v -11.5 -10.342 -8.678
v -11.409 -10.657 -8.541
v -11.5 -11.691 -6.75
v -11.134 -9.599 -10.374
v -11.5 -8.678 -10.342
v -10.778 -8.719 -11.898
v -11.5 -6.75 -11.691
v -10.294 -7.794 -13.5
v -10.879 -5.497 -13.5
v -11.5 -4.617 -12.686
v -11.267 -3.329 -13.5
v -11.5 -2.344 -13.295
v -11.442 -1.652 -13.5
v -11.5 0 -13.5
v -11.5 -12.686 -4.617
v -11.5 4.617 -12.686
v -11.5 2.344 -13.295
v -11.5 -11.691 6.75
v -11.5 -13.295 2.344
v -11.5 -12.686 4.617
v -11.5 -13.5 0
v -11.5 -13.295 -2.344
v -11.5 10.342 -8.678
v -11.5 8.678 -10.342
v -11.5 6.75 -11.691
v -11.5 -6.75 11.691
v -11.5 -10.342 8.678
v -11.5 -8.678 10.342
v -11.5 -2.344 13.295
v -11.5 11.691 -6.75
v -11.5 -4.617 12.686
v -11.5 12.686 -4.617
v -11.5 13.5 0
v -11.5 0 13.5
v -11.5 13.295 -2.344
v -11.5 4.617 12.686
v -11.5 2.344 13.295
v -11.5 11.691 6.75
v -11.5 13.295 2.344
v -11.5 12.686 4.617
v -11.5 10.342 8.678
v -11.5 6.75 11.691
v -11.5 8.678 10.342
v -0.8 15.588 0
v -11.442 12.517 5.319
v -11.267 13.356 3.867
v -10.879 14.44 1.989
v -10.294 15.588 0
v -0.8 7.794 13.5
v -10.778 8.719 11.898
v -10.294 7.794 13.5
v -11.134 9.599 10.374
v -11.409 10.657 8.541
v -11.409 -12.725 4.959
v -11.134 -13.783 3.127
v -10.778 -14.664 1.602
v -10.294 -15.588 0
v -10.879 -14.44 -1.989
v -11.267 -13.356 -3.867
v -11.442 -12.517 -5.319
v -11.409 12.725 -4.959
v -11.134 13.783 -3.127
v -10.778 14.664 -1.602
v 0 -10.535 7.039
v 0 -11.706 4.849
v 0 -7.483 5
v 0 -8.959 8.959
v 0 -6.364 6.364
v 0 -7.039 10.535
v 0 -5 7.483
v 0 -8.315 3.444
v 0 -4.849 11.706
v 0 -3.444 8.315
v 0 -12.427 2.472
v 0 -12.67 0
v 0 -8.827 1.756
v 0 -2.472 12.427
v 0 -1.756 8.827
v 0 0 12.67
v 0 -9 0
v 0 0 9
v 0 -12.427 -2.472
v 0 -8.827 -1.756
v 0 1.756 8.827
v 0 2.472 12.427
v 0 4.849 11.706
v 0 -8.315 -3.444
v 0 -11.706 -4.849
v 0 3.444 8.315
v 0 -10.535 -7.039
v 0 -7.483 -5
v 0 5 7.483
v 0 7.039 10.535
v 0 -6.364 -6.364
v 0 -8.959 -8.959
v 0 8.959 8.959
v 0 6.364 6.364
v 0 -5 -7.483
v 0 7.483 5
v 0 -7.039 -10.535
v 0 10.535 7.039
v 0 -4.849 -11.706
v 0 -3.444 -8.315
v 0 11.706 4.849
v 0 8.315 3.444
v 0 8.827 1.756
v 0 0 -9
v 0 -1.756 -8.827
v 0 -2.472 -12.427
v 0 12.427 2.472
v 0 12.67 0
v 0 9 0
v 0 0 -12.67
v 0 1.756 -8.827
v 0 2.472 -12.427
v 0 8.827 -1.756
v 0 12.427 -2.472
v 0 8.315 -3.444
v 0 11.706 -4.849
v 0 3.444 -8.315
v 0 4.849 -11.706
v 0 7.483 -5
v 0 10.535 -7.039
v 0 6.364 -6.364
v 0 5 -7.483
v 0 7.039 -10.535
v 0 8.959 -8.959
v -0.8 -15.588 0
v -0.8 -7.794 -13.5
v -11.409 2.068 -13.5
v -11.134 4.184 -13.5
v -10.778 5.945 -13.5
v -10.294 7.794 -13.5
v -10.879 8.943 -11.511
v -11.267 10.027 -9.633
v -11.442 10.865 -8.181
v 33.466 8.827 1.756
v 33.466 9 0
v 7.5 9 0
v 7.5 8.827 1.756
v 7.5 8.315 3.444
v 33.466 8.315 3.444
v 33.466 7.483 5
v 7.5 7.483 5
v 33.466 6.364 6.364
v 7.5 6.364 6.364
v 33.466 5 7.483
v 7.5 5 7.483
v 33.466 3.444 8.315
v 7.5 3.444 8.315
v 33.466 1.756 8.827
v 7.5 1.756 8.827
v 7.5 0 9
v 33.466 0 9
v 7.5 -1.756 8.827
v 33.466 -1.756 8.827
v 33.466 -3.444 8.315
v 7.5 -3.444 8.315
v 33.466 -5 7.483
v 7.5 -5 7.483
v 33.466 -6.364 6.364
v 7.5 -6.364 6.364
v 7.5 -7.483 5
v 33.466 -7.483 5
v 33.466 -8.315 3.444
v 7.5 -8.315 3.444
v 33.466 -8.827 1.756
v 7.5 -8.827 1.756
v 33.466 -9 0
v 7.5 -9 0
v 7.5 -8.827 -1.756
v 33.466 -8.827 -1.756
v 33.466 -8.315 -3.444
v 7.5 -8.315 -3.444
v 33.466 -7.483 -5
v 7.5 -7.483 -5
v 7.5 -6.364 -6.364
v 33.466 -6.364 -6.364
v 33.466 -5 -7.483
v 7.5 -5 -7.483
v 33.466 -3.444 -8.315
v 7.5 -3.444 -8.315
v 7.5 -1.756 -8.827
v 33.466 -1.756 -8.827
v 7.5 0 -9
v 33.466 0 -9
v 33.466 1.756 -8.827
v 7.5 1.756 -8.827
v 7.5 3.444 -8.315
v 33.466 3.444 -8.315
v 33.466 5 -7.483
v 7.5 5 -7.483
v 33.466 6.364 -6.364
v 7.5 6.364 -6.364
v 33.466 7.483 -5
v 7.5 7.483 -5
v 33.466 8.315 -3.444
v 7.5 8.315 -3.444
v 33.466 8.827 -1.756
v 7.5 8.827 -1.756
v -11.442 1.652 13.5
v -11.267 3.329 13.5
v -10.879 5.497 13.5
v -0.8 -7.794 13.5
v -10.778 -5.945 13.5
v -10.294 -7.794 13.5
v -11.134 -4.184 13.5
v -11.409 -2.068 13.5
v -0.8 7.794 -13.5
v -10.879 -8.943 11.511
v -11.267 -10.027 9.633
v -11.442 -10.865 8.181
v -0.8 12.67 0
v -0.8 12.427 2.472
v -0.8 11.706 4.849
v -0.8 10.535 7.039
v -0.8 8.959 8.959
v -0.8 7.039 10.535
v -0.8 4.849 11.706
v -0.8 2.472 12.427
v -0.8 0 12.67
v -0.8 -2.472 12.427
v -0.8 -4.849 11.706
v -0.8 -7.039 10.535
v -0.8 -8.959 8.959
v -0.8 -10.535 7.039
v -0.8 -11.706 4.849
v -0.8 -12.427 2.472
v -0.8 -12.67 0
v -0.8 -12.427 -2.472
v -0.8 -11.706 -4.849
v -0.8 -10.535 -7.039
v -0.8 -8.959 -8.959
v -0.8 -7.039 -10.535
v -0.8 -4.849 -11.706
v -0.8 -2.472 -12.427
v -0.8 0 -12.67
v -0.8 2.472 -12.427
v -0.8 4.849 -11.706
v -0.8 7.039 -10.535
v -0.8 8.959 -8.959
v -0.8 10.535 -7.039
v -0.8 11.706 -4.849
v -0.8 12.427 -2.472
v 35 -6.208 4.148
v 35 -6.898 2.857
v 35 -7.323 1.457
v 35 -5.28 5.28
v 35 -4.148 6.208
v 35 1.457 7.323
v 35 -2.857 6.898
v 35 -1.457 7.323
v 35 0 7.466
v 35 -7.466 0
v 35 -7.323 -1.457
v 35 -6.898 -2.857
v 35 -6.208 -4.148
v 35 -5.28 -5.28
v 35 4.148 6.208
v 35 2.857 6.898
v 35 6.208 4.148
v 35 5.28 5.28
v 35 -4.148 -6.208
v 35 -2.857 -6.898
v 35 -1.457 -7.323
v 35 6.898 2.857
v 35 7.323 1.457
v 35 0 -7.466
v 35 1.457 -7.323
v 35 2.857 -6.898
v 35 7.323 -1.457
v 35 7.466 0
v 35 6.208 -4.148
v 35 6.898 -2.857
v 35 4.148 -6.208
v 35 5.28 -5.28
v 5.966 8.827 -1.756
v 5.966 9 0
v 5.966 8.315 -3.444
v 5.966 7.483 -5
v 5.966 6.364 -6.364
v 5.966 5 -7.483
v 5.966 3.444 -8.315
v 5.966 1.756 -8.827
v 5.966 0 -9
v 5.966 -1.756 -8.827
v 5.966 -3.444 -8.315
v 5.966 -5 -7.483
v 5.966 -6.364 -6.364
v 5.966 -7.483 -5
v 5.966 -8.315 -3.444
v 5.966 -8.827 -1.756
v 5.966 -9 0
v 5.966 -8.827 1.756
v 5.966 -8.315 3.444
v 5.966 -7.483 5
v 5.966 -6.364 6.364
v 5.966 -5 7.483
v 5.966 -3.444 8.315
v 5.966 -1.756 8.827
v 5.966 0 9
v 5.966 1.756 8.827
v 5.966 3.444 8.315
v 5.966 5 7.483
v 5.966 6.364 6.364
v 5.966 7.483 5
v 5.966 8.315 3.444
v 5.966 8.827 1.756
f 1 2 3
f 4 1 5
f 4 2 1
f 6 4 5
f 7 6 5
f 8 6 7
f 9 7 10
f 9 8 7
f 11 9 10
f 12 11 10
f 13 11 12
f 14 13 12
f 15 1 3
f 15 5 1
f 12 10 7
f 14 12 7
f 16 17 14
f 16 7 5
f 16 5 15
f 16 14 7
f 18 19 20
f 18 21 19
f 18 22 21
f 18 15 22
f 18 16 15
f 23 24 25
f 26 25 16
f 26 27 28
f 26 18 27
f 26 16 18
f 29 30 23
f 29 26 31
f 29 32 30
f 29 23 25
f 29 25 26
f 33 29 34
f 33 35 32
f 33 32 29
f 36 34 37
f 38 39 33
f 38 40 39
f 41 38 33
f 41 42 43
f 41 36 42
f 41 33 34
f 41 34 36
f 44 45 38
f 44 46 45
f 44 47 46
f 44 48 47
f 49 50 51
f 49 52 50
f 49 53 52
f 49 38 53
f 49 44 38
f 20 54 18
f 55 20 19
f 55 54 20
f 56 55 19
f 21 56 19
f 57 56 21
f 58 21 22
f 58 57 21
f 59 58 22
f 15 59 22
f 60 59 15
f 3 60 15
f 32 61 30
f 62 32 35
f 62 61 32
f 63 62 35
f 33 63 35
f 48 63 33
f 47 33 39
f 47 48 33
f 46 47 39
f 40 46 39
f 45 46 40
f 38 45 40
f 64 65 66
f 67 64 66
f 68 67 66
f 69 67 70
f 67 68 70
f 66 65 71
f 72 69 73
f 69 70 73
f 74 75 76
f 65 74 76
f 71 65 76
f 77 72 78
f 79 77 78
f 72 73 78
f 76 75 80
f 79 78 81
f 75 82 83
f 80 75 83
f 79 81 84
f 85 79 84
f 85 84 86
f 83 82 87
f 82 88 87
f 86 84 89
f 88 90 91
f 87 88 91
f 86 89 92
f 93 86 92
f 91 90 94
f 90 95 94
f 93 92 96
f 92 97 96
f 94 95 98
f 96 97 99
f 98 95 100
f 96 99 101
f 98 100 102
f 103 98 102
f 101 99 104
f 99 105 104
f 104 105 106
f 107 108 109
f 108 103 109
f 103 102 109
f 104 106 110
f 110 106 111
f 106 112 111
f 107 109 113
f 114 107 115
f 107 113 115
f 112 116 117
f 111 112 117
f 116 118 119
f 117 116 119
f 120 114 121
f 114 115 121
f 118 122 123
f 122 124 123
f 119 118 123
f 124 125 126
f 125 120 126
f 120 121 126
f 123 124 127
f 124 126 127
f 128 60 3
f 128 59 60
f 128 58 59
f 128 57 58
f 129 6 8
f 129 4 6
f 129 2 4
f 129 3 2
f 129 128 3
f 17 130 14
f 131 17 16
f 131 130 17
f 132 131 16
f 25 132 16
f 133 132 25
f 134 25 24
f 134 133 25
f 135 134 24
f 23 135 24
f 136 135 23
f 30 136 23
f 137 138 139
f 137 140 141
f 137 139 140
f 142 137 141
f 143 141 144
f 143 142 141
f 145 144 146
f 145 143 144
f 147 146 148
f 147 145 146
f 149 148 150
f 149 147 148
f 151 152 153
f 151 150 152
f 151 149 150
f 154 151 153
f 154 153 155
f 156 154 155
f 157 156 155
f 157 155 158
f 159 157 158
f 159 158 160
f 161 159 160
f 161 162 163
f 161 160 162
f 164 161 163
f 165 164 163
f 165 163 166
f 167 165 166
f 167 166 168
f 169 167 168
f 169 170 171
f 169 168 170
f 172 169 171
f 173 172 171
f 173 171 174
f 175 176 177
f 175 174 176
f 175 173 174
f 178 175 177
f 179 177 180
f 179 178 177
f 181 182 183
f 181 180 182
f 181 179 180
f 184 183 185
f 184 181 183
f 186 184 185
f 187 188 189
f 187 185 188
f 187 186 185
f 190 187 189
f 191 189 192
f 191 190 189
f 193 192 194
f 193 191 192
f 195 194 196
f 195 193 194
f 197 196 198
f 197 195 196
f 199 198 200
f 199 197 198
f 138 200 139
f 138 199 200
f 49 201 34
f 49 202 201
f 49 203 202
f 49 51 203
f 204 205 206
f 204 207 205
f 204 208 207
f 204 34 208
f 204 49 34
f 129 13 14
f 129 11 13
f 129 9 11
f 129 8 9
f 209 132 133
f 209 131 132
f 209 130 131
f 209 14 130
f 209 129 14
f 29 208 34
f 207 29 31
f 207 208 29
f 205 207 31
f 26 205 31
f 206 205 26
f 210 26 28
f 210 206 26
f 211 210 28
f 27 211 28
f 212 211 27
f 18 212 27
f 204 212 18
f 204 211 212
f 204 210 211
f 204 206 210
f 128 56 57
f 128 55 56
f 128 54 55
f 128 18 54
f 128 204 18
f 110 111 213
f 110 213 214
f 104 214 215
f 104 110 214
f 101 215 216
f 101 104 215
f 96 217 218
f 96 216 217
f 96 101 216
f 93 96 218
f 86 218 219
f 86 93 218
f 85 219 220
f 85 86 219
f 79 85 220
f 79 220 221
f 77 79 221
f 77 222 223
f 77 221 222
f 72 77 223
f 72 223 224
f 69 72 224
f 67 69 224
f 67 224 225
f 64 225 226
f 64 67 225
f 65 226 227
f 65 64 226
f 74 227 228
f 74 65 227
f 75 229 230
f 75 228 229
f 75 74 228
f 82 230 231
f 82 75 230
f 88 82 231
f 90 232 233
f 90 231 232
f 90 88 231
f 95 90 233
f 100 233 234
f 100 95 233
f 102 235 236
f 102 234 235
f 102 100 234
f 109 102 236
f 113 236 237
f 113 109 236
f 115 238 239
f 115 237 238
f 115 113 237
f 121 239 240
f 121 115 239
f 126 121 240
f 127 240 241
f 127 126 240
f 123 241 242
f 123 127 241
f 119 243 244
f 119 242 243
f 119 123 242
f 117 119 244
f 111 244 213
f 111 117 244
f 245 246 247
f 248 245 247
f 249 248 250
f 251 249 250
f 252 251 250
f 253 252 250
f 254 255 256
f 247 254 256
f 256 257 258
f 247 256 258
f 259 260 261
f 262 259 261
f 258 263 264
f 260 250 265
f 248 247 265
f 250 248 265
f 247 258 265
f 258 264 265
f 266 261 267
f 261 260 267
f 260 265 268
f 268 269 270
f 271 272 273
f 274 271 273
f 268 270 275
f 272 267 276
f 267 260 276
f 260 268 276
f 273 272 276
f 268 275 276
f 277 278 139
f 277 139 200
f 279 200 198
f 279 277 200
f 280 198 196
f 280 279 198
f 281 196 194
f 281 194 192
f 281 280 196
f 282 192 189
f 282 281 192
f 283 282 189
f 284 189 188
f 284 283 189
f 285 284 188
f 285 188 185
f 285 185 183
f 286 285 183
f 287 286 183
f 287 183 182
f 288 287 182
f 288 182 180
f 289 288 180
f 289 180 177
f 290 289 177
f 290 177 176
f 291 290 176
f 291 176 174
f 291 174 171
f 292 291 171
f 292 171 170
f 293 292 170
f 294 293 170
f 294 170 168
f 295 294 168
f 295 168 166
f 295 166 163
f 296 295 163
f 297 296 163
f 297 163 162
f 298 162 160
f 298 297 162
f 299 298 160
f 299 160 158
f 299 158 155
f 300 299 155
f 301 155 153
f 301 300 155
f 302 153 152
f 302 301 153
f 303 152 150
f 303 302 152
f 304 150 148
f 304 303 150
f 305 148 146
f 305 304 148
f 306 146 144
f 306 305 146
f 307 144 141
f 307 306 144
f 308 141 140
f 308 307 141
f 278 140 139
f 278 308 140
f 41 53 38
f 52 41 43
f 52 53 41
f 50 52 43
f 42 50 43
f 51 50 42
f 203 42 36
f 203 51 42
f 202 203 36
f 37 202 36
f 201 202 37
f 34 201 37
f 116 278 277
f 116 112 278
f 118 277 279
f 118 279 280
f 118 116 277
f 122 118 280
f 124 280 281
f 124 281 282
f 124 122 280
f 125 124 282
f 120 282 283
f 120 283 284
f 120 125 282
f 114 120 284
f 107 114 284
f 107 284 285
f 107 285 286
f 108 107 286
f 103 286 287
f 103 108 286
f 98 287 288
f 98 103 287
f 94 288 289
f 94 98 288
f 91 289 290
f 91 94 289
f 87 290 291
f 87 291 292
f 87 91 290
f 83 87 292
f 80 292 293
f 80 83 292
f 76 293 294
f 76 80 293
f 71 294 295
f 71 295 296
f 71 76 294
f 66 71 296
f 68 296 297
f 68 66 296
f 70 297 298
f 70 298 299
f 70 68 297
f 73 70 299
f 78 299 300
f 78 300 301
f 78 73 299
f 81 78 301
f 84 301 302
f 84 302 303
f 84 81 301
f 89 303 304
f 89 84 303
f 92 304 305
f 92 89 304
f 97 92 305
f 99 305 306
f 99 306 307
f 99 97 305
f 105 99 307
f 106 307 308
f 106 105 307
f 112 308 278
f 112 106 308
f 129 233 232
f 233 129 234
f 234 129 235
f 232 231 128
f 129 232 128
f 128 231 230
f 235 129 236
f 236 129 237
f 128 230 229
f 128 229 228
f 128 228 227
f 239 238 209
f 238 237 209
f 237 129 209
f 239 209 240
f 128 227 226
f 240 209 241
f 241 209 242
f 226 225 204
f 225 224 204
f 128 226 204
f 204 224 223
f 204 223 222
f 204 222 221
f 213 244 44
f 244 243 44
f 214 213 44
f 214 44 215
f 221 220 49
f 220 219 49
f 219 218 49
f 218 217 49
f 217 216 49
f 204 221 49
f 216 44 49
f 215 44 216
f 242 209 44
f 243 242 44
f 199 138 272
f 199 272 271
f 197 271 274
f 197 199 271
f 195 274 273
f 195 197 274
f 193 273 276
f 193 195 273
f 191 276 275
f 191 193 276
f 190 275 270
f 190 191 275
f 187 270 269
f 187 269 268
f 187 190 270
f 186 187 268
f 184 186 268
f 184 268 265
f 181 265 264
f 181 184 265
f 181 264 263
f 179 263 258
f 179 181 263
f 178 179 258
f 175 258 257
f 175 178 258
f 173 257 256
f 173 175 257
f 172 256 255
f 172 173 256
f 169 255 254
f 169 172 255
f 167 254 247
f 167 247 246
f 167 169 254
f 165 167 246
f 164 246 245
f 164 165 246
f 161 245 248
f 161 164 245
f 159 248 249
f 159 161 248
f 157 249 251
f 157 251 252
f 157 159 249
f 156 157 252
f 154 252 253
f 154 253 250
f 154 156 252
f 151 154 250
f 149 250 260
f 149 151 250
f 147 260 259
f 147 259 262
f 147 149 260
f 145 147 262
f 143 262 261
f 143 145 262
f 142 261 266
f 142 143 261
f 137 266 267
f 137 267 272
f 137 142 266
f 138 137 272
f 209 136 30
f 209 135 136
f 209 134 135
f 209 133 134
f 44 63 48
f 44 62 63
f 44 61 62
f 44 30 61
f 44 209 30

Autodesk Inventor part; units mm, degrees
ref_plane "YZ Plane" through (0, 0, 0) normal (1, 0, 0) x (0, 1, 0)
ref_plane "XZ Plane" through (0, 0, 0) normal (0, 1, 0) x (-1, 0, 0)
sketch "Sketch1" plane through (0, 0, 0) normal (0, 0, 1) x (1, 0, 0)
  line L0 (0, 12.67) -> (0, 9)
  line L1 (7.5, 9) -> (35, 9)
  line L2 (35, 9) -> (35, 0)
  line L3 (35, 0) -> (-0.8001, 0)
  line L4 (-7.9601, 0) -> (42.16, 0) projected
  line L5 (-0.8001, 0) -> (-0.8001, 12.67)
  line L6 (-0.8001, 12.67) -> (0, 12.67)
  line L7 (7.5, 9) -> (5.9663, 9)
  line L8 (5.9663, 9) -> (0, 9)
  line L9 (0, -2.534) -> (0, 15.204) projected
  dimension "d0" = 35
  dimension "d1" = 27.5
  dimension "d2" = 18
  dimension "d9" = 0.8001
  dimension "d10" = 25.34
  dimension "d13" = 1.5337
  dimension "d14" = 18
revolve "Body" add sketch "Sketch1" angle 360 about axis through (35, 0, 0) along (-1, 0, 0)
sketch "Sketch2" plane through (-0.8001, 0, 0) normal (-1, 0, 0) x (0, 0, 1)
  line L0 (0, 15.5885) -> (13.5, 7.7942)
  line L1 (13.5, 7.7942) -> (13.5, -7.7942)
  line L2 (13.5, -7.7942) -> (0, -15.5885)
  line L3 (0, -15.5885) -> (-13.5, -7.7942)
  line L4 (-13.5, -7.7942) -> (-13.5, 7.7942)
  line L5 (-13.5, 7.7942) -> (0, 15.5885)
  point P0 (0, 0)
  point P1 (0, 0)
  dimension "d11" = 27
extrude "Head" add sketch "Sketch2" along normal blind 10.7
sketch "Sketch4" plane through (0, 0, 0) normal (0, 0, 1) x (1, 0, 0)
  line L0 (-11.5001, 13.5) -> (-11.5001, 15.5885)
  line L1 (-11.5001, 15.5885) -> (-10.2943, 15.5885)
  line L2 (-10.2943, 15.5885) -> (-11.5001, 13.5)
  line L3 (-13.6401, 0) -> (1.3399, 0) projected
  line L4 (-0.8001, 15.5885) -> (-11.5001, 15.5885) projected
  line L5 (-11.5001, 7.7942) -> (-11.5001, 15.5885) projected
  dimension "d5" = 30
  dimension "d19" = 27
revolve "Chamfer1" cut sketch "Sketch4" angle 360 about axis through (-10, 0, 0) along (1, 0, 0)
thread "Thread" size "M18x2.5" class "6g" standard "ISO Metric profile" length 27.5
chamfer "Chamfer2" distance 1.5336 distance2 1.5337 1 edges at (35, -9, 0) measured on face at (35, 1.0638, -2.805)
ref_plane "Work Plane1" through (1.525, 0, 0) normal (0, 0, 1) x (1, 0, 0)
equation "\"d0\" = NLG"
equation "\"d1\" = GEL"
equation "\"d2\" = GD"
equation "\"d10\" = SD2"
equation "\"d14\" = BDM"
equation "\"d11\" = SW"
equation "\"d3\" = KOH - SD"
equation "\"d5\" = ANG1"
equation "\"d19\" = SW0"
equation "\"d15\" = GEL"
equation "\"d6\" = -0.5 * SPD + 0.5 * GD"
equation "\"NLG\" = 35"
equation "\"GD\" = NND"
equation "\"BDM\" = NND"
equation "\"KOH\" = 11.5"
equation "\"GEL\" = 27.5"
equation "\"SW\" = 27"
equation "\"SW0\" = SW"
equation "\"SPD\" = NND - 1.2269 * PTC"
equation "\"SD2\" = 25.34"
equation "\"SD\" = 0.8"
equation "\"ANG1\" = 30deg"
equation "\"GAL\" = 0.61345 * PTC"
equation "\"GUL\" = 0.61345 * PTC"
equation "\"RR\" = 0.6"
equation "\"GD1\" = THREADDIA - 1.2269 * PTC"
equation "\"THREADDIA\" = 18"
equation "\"SDH\" = SD2"
equation "\"SDHG\" = 7.5"
equation "\"TOA\" = 30deg"
equation "\"PTC\" = 2.5"
equation "\"NND\" = 18"
equation "\"E0\" = 31.185"
properties part number "ISO 4017 - M18 x 35" material "Stainless Steel, 440C"
